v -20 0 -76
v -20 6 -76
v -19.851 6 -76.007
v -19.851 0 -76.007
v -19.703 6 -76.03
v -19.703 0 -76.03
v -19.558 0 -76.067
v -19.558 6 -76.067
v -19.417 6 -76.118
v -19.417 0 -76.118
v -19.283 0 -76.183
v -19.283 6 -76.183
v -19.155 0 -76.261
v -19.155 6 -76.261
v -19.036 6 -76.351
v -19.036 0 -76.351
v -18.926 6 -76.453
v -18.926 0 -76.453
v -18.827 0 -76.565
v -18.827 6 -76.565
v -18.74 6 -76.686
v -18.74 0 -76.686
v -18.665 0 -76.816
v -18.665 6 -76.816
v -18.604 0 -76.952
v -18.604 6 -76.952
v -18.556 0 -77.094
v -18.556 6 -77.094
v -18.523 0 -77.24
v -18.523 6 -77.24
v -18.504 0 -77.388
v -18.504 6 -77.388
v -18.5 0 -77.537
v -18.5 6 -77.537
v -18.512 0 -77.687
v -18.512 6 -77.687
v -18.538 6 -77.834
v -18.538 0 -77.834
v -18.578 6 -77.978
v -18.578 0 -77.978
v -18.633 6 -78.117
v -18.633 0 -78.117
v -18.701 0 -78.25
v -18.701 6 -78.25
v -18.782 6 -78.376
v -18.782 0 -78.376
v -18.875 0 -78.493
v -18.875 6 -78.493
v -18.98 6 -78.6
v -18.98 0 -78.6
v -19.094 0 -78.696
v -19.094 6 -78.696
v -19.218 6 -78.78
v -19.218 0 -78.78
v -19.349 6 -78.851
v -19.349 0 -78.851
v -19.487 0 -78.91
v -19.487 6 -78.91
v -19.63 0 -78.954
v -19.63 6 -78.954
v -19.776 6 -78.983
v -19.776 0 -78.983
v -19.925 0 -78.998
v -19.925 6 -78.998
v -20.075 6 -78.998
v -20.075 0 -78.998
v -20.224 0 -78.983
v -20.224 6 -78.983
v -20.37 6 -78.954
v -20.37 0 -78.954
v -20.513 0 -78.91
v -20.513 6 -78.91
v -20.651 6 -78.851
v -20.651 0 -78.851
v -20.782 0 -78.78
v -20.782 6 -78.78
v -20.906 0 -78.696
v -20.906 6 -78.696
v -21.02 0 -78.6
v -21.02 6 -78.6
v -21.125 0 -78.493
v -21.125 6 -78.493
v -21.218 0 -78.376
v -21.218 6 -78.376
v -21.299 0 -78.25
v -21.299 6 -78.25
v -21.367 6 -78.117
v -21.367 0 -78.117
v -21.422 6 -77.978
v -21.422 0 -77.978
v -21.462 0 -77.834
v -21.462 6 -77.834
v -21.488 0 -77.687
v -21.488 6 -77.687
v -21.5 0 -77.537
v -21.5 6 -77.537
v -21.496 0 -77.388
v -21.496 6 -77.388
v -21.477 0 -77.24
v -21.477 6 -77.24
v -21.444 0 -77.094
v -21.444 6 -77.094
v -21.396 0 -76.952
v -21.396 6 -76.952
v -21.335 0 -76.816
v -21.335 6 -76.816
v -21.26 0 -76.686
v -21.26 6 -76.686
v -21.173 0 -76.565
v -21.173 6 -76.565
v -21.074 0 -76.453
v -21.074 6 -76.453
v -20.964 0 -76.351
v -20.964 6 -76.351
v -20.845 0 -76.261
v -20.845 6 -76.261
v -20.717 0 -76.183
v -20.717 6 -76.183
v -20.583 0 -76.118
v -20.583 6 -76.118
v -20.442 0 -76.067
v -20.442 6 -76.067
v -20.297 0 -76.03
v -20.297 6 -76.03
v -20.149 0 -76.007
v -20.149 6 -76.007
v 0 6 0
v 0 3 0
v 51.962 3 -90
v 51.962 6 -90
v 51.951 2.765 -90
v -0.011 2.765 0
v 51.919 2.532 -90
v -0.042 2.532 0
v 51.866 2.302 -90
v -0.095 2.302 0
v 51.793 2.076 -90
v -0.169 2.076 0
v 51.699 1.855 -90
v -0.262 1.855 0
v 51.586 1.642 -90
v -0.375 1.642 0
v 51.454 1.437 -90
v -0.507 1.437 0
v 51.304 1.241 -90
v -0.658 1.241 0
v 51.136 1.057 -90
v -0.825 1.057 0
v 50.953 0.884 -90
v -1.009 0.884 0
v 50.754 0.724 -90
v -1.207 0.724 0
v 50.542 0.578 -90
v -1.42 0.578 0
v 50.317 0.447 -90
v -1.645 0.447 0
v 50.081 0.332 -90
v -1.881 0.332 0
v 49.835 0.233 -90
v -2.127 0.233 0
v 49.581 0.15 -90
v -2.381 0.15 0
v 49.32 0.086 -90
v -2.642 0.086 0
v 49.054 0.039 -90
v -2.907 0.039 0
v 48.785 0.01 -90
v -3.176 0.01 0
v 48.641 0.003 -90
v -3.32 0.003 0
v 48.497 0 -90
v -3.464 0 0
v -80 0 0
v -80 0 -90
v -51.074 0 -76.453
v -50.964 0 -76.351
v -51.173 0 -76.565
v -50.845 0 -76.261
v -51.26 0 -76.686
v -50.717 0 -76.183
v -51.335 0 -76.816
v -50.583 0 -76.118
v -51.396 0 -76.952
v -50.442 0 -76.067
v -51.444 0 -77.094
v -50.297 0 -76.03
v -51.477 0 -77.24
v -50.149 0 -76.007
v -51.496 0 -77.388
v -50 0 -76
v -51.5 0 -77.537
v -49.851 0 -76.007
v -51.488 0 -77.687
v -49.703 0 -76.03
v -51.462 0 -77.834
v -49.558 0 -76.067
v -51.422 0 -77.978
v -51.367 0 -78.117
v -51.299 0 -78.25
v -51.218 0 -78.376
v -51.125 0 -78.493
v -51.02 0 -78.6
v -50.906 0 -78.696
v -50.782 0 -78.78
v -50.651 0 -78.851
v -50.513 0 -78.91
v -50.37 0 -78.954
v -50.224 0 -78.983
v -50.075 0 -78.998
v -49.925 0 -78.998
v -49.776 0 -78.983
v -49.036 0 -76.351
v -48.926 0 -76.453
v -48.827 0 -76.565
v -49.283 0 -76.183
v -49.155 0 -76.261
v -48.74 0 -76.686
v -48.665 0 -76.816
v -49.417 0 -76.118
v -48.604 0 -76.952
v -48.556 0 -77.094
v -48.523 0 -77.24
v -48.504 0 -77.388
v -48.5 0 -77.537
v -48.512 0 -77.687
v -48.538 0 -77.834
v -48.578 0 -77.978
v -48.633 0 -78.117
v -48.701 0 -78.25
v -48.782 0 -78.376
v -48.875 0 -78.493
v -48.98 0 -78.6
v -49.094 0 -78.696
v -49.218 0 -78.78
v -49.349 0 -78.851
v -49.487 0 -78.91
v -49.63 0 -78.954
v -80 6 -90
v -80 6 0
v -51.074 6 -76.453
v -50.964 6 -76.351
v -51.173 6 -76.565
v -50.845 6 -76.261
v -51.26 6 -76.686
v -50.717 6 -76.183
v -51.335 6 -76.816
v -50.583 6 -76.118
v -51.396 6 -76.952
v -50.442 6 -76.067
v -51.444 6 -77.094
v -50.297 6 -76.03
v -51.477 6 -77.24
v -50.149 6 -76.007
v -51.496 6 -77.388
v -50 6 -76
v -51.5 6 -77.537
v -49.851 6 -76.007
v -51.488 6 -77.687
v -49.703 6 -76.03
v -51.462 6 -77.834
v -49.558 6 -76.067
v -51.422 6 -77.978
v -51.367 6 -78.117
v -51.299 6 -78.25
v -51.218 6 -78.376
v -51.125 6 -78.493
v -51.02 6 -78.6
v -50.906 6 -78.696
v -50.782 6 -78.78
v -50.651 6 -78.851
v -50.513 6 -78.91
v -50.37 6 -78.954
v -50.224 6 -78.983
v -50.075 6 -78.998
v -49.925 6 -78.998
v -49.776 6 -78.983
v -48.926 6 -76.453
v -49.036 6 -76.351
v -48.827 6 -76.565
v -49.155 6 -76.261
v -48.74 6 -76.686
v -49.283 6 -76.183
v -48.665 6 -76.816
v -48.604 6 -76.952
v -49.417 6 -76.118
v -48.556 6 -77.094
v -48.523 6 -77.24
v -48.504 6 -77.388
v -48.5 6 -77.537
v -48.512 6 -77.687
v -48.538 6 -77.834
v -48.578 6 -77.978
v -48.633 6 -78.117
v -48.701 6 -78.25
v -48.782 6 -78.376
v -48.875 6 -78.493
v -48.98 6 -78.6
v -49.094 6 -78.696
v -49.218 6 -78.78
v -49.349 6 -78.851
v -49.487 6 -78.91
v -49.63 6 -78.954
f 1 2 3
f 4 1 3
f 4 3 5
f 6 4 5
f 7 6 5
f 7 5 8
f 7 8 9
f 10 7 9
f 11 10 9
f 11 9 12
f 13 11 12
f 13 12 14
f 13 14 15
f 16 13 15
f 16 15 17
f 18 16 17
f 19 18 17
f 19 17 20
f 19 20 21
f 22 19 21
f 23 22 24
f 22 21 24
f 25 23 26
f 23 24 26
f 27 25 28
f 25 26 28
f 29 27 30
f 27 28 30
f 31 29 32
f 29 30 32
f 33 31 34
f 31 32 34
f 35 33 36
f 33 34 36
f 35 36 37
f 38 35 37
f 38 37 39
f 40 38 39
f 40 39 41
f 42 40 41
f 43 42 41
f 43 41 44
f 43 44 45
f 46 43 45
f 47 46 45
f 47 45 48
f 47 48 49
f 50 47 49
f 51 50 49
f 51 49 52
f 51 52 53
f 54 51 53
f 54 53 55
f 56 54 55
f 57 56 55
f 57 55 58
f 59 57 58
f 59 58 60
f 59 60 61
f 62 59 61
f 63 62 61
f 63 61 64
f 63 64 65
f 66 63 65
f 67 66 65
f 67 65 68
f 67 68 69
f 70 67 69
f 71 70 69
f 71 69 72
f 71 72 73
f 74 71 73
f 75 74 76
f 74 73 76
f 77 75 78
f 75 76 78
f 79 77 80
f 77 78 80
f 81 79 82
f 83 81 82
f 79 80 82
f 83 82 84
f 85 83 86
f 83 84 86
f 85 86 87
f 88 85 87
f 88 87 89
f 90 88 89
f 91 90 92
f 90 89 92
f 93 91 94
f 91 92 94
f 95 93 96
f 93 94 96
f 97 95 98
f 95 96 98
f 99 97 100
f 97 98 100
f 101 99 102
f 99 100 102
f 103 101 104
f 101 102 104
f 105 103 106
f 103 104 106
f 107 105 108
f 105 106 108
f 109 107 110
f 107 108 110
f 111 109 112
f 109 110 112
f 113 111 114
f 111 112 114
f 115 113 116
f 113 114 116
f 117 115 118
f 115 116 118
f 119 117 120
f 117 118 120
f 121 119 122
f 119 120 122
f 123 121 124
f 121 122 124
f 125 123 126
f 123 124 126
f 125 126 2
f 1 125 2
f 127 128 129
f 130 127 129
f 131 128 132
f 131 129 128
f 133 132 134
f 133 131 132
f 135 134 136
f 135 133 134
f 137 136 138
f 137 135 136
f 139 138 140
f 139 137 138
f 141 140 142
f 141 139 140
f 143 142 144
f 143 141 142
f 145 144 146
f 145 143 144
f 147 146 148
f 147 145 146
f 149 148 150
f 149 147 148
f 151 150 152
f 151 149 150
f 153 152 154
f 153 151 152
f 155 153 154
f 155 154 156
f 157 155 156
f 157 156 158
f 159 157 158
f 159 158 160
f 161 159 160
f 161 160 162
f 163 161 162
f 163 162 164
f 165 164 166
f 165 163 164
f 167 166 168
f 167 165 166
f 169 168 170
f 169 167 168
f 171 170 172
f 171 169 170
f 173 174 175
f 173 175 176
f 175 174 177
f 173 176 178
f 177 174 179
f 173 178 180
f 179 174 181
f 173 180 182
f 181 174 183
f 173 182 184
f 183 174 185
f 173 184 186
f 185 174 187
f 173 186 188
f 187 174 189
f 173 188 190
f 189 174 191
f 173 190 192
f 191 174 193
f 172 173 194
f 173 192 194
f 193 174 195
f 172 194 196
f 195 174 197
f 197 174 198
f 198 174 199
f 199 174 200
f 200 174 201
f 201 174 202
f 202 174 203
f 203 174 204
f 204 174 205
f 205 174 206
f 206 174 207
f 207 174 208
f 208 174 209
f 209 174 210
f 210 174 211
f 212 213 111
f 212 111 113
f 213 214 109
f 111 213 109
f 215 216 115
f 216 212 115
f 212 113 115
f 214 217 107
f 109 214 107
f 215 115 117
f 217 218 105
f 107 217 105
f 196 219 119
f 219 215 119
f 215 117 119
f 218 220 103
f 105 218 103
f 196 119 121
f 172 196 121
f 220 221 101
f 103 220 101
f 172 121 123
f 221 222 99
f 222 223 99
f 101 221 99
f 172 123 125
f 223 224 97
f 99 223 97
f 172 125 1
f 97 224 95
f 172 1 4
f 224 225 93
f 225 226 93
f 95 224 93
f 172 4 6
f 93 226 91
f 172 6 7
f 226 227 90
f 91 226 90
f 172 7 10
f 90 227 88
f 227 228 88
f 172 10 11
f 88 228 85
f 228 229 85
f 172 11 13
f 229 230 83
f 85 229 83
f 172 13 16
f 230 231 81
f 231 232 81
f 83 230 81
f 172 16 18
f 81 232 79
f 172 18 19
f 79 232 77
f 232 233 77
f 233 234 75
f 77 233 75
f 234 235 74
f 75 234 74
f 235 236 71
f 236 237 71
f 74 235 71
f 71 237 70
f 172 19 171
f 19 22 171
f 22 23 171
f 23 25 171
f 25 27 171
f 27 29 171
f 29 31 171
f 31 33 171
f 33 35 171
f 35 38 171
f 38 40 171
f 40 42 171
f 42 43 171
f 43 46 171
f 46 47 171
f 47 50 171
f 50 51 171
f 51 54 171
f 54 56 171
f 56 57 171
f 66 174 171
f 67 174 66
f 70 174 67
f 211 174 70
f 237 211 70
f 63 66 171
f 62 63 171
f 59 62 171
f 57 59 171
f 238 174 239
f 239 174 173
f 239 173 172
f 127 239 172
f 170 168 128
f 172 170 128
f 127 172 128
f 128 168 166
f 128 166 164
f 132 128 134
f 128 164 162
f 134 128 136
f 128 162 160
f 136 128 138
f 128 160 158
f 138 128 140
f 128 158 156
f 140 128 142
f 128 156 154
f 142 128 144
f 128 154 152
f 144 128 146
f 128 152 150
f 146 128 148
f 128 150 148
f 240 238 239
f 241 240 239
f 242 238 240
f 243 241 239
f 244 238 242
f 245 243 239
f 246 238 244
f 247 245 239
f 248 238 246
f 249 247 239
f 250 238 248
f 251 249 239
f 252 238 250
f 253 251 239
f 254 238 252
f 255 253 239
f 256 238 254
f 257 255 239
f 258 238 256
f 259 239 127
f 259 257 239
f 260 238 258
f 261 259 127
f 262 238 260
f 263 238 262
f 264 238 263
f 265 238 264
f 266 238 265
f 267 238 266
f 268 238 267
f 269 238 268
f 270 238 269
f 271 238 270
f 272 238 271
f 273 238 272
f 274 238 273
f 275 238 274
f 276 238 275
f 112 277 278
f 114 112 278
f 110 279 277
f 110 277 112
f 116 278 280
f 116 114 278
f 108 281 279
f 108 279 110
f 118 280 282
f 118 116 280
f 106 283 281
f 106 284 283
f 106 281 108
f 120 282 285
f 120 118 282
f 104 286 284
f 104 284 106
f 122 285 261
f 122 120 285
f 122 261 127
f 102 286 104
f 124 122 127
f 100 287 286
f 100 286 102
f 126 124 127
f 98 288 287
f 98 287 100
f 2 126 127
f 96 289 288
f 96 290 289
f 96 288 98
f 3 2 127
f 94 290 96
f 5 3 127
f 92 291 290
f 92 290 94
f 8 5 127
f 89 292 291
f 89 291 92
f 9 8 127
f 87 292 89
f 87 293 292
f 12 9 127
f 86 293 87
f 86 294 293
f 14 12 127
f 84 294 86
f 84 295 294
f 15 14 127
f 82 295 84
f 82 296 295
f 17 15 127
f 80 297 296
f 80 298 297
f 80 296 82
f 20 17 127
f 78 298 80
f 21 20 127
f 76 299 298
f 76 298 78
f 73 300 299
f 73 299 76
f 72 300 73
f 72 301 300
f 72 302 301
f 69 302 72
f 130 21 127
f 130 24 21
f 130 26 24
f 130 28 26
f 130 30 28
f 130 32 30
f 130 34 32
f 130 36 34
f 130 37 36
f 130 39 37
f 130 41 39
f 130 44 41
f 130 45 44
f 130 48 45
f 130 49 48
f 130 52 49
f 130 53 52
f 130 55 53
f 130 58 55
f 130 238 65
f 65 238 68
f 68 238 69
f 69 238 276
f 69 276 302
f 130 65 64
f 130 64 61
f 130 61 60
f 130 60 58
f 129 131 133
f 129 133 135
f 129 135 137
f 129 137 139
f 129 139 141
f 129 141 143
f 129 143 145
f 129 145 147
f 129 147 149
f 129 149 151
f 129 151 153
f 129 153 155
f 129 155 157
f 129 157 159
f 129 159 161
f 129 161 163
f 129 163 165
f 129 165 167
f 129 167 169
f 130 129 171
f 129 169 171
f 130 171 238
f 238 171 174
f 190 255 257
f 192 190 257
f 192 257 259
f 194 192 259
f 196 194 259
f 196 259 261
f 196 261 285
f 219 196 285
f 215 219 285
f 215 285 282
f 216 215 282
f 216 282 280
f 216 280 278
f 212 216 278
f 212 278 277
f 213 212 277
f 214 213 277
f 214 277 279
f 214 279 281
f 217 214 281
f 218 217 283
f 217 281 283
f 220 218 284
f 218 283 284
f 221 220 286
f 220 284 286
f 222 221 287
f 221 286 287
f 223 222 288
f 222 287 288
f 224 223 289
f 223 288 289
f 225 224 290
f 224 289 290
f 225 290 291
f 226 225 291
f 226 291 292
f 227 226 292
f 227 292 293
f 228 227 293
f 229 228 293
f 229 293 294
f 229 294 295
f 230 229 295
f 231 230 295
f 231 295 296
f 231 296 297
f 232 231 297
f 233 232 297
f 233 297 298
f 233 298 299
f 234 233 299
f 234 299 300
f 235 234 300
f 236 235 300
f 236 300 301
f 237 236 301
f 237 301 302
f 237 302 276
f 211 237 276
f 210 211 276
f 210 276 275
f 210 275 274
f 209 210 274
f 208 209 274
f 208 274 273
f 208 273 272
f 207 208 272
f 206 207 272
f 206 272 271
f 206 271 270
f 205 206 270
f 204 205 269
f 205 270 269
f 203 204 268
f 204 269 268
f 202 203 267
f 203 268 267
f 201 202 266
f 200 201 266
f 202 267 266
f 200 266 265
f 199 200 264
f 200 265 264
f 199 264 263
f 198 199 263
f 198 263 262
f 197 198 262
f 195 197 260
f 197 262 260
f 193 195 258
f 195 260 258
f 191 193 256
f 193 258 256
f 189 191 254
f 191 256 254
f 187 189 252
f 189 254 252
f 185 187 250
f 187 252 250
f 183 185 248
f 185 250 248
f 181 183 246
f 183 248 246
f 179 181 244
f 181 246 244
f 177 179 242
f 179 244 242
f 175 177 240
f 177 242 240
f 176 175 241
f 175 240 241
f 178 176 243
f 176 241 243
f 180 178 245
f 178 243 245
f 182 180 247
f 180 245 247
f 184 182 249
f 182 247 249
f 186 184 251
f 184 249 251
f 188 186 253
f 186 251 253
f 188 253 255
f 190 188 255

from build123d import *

# Parameters (mm, degrees)
BOSS_EXTRUDE1_DEPTH = 6
FILLET1_R           = 3
SKETCH2_R           = 1.5
CUT_EXTRUDE1_DEPTH  = 121.565334985


with BuildPart() as part:
    # Sketch1 → Boss-Extrude1 (new body)
    with BuildSketch(Plane(origin=(0, 0, 0), x_dir=(1, 0, 0), z_dir=(0, 1, 0))):
        Polygon((0, 0), (51.961524227, 90), (0, 90), (-80, 90), (-80, 0), align=None)
    extrude(amount=BOSS_EXTRUDE1_DEPTH)

    # Fillet1
    fillet1_edges = [part.edges().sort_by_distance(p)[0] for p in [
        (25.980762114, 0, -45),
    ]]
    fillet(fillet1_edges, radius=FILLET1_R)

    # Sketch2 → Cut-Extrude1 (cut, through all)
    with BuildSketch(Plane(origin=(0, 6, 0), x_dir=(1, 0, 0), z_dir=(0, 1, 0))):
        with Locations(Location((-50, 77.5, 0), (0, 0, 270))):
            Circle(SKETCH2_R)
        with Locations(Location((-20, 77.5, 0), (0, 0, 270))):
            Circle(SKETCH2_R)
    extrude(amount=-CUT_EXTRUDE1_DEPTH, mode=Mode.SUBTRACT)


solid = part.part
